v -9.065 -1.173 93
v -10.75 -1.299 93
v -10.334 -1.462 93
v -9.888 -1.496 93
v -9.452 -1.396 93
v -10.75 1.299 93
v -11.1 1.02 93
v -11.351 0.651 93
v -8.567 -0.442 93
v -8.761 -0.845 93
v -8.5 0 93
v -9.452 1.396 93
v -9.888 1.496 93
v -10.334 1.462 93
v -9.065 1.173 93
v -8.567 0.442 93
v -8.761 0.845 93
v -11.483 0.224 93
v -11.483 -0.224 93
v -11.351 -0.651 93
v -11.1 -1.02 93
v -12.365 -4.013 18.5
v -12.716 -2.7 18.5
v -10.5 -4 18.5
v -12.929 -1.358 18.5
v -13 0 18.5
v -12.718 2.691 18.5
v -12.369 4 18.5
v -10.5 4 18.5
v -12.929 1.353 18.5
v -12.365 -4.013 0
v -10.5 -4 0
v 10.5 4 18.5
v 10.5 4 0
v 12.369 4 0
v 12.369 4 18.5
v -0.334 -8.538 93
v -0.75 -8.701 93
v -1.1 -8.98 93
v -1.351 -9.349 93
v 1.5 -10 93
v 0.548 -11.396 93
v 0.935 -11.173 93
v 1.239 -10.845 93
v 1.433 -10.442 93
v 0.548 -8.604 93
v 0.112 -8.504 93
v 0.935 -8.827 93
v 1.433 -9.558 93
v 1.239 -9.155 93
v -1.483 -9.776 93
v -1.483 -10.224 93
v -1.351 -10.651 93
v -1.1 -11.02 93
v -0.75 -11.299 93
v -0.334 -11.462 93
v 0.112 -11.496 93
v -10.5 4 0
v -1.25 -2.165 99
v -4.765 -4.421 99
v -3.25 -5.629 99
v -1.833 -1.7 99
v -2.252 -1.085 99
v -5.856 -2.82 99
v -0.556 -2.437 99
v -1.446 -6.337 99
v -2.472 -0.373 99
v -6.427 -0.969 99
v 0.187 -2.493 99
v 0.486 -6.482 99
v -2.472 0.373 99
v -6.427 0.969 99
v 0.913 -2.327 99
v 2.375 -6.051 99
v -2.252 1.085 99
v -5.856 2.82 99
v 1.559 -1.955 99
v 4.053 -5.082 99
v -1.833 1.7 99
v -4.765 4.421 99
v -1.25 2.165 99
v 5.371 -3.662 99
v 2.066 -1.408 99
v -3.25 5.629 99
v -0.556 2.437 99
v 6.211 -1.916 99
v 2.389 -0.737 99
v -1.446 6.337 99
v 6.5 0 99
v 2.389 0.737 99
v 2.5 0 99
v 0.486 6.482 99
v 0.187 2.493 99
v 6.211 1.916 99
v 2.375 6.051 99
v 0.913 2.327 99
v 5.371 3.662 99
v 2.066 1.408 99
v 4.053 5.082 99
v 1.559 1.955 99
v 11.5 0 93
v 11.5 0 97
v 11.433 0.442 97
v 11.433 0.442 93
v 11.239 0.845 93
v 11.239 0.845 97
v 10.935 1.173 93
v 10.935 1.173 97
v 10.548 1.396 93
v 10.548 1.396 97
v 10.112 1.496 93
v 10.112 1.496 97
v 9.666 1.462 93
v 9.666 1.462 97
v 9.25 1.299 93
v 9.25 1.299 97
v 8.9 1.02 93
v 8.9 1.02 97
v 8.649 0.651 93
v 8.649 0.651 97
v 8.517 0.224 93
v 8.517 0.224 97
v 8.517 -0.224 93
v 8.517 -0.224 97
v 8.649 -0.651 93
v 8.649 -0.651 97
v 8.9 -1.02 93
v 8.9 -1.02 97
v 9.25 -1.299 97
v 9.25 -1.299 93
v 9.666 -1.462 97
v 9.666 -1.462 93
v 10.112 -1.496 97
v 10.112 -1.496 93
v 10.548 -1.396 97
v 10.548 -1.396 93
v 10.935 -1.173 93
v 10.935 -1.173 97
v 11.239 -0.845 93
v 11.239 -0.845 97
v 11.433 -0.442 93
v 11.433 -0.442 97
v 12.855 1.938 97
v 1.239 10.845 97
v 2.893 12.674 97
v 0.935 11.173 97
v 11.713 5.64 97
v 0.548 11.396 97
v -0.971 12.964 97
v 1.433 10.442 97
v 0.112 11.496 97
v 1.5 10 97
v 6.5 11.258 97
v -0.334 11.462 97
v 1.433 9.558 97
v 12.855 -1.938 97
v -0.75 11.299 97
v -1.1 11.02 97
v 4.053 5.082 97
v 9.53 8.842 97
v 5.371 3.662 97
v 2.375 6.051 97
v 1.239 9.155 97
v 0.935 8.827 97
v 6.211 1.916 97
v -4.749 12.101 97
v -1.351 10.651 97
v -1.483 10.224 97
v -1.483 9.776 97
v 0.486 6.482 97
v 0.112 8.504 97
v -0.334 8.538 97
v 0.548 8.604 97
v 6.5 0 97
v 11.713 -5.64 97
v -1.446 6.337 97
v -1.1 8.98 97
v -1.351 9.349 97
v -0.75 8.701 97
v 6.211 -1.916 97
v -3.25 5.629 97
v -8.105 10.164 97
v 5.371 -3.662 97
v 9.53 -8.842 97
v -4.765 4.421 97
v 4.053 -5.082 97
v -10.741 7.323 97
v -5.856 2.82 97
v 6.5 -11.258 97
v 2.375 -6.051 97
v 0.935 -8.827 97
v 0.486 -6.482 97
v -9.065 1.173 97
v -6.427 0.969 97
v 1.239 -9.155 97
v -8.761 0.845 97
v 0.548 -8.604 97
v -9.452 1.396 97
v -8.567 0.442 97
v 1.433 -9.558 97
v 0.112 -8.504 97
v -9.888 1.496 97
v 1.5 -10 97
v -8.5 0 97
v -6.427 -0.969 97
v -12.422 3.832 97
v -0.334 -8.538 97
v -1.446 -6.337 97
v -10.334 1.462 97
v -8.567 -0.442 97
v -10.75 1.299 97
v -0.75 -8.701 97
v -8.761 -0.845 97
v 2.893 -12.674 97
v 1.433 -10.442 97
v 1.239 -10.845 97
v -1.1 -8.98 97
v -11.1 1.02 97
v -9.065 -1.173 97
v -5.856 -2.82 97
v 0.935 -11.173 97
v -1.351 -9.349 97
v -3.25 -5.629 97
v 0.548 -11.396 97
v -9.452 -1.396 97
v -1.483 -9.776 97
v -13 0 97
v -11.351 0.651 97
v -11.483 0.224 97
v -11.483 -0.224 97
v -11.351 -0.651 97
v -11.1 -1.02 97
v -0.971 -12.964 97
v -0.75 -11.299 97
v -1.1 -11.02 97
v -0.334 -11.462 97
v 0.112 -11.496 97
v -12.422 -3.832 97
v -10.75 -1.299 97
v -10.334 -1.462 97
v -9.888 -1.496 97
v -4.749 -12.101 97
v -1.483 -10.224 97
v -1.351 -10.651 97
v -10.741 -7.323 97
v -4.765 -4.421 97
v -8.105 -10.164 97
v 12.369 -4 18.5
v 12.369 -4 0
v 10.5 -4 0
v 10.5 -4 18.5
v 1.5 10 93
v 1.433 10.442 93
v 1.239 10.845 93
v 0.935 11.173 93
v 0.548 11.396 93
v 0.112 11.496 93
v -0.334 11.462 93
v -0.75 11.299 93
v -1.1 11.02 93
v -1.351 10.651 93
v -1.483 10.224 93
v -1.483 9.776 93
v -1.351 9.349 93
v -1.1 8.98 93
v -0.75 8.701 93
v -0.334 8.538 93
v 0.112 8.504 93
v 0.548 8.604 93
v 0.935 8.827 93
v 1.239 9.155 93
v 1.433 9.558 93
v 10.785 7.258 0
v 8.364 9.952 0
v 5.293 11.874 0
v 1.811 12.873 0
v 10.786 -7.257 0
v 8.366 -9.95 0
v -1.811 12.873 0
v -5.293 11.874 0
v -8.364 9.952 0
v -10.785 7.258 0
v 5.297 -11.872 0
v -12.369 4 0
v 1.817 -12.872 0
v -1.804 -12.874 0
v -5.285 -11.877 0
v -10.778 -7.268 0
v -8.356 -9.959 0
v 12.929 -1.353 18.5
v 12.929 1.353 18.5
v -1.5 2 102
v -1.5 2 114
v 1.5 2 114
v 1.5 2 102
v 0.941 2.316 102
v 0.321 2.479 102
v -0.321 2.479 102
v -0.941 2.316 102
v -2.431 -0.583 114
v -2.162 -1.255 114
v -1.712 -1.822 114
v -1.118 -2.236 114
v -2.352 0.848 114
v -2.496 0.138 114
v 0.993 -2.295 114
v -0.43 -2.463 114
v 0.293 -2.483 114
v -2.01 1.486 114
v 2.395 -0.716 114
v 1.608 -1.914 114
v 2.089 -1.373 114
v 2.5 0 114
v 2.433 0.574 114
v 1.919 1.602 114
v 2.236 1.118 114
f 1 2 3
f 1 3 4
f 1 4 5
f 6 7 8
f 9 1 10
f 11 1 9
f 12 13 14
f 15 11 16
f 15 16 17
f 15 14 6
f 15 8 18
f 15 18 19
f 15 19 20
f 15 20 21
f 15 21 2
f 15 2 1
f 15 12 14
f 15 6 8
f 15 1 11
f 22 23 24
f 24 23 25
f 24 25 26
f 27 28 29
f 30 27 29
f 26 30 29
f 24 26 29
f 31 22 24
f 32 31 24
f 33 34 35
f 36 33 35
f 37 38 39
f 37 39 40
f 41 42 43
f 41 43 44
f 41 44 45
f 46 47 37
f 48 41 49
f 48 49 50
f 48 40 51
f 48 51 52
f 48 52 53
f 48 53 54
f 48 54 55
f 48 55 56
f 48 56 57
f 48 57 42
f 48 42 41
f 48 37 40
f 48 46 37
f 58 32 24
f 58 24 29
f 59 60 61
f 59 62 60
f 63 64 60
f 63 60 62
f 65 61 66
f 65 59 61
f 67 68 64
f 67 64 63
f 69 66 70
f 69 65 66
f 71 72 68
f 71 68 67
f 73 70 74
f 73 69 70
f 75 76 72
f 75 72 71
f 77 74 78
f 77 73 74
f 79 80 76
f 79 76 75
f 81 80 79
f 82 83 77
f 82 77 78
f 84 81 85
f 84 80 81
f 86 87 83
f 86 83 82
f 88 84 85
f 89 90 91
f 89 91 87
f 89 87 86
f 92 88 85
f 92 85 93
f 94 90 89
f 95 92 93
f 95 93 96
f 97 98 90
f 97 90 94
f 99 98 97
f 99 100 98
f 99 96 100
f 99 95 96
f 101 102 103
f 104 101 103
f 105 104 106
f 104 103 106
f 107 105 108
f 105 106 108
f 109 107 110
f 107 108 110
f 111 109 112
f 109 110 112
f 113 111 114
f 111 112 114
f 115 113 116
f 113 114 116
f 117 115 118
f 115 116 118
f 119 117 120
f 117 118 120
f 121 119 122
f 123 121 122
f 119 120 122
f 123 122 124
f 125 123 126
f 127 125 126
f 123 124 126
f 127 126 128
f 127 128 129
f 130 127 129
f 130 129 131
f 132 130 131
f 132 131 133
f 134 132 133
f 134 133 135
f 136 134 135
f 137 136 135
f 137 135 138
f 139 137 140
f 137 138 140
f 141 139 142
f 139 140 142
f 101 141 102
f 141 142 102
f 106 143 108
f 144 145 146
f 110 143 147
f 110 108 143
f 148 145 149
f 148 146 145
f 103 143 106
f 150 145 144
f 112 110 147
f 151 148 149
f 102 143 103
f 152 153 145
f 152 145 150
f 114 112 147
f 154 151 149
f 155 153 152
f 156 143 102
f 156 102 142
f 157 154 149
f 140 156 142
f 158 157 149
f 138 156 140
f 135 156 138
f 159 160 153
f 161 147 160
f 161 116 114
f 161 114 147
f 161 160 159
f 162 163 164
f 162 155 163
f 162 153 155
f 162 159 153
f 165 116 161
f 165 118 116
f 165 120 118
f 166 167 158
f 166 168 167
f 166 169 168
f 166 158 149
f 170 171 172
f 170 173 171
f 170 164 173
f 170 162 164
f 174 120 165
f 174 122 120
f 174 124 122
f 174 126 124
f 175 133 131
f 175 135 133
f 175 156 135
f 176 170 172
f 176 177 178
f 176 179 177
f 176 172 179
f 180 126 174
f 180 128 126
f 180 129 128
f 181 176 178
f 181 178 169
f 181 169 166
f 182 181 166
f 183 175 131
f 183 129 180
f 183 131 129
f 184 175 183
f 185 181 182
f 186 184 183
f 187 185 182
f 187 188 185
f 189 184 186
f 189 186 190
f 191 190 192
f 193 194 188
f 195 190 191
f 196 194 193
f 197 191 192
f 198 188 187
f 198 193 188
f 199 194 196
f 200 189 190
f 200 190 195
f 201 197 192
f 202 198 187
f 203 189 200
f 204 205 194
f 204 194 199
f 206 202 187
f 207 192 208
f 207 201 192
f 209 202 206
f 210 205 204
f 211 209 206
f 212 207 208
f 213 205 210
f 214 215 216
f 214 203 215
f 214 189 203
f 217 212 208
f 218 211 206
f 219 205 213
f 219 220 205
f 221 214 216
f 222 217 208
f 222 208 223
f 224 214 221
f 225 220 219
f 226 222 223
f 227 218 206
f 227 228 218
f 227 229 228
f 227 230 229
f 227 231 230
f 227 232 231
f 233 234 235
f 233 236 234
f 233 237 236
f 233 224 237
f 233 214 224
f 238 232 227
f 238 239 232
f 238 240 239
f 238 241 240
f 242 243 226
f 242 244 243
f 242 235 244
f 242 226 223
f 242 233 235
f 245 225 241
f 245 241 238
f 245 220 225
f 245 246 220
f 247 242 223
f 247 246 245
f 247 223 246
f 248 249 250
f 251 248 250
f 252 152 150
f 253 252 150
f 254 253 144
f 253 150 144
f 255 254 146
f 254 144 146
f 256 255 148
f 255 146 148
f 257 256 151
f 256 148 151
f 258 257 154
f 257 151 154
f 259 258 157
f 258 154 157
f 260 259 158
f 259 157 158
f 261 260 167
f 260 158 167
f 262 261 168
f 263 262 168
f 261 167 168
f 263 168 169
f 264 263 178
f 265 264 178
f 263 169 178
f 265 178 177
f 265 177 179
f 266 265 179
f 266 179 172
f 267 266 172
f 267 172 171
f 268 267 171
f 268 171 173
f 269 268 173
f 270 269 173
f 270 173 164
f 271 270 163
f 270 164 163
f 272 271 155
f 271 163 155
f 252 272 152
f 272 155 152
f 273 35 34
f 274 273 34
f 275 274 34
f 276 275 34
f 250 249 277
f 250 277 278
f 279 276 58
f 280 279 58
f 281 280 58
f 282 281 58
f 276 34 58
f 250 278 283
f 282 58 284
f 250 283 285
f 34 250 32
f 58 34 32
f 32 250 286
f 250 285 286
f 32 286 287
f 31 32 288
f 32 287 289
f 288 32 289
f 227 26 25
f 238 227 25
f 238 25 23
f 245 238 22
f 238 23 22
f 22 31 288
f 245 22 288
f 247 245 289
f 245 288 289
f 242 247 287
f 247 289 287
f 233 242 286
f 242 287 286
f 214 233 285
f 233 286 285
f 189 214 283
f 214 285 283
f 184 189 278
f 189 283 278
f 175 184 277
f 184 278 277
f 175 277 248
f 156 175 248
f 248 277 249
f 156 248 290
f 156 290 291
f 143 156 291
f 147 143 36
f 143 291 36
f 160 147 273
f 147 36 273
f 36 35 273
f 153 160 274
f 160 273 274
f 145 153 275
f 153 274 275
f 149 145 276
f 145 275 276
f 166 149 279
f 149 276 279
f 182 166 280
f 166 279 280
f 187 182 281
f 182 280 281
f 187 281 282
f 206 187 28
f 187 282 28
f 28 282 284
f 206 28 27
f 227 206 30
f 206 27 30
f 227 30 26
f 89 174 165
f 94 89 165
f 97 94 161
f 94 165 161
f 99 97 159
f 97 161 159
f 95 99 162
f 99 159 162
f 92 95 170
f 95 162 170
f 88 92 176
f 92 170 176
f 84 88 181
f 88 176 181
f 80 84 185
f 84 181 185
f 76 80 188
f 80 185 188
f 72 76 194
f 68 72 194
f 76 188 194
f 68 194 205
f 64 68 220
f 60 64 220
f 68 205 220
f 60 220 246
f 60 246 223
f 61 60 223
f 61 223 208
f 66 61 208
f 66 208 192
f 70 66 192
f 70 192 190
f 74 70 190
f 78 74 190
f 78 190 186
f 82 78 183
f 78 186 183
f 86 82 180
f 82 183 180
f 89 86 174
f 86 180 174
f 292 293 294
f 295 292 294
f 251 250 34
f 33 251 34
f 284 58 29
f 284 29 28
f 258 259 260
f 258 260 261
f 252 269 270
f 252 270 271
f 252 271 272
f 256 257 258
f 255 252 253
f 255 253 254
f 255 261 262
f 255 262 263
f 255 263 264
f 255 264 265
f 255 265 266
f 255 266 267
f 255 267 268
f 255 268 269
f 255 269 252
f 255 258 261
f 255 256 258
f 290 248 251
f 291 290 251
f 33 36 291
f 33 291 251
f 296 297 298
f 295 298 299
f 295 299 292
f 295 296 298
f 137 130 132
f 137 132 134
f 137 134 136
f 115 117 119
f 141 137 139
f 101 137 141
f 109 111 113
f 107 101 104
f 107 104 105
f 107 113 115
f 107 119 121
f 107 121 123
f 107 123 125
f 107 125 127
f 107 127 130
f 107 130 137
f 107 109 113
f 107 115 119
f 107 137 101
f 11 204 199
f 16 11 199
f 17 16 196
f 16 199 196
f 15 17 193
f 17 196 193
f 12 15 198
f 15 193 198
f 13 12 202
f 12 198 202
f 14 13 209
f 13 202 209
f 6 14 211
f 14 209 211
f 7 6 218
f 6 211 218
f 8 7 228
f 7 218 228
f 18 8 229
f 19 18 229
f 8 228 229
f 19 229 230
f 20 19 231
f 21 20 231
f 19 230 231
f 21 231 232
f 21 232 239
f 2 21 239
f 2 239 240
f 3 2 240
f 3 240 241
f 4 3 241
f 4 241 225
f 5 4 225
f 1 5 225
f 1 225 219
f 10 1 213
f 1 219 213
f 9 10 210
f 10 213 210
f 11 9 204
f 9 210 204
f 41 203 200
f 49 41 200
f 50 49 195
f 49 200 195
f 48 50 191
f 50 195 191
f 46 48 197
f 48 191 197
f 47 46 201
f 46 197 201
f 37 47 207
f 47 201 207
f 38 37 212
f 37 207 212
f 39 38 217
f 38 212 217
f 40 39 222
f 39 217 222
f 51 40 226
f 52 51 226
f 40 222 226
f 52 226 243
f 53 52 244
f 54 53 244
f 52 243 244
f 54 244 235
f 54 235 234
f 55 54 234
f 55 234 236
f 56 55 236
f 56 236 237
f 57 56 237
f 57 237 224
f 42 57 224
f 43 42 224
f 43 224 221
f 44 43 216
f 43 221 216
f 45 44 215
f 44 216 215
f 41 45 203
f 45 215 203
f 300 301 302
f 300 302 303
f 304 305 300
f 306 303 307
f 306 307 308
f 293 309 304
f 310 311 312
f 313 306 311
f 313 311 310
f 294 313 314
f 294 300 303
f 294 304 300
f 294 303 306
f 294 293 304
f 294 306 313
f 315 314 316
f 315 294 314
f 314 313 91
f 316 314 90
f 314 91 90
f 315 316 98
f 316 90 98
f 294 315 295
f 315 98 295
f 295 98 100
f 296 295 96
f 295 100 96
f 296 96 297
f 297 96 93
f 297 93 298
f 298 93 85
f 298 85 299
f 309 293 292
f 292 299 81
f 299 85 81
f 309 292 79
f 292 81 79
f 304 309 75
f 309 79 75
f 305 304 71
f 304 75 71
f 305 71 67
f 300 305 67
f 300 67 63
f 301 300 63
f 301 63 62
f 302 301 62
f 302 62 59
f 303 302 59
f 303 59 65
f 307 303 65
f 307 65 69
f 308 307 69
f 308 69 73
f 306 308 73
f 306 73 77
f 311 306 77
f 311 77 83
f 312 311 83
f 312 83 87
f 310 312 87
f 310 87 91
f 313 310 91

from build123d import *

# Parameters (mm, degrees)
ESQUISSE1_R             = 13
BOSS_EXTRU_1_DEPTH      = 97
ESQUISSE2_R             = 2.5
BOSS_EXTRU_2_DEPTH      = 17
ENL_V_MAT_EXTRU_1_DEPTH = 18.5
ESQUISSE4_R             = 6.5
ESQUISSE4_R_2           = 2.5
BOSS_EXTRU_3_DEPTH      = 2
ESQUISSE5_R             = 1.5
ENL_V_MAT_EXTRU_2_DEPTH = 4
ENL_V_START             = -12
ENL_V_MAT_EXTRU_3_DEPTH = 12


with BuildPart() as part:
    # Esquisse1 → Boss.-Extru.1 (new body)
    with BuildSketch(Plane.XY):
        with Locations(Location((0, 0, 0), (0, 0, 180))):
            Circle(ESQUISSE1_R)
    extrude(amount=BOSS_EXTRU_1_DEPTH)

    # Esquisse2 → Boss.-Extru.2 (add)
    with BuildSketch(Plane.XY.offset(97)):
        Circle(ESQUISSE2_R)
    extrude(amount=BOSS_EXTRU_2_DEPTH)

    # Esquisse3 → Enlèv. mat.-Extru.1 (cut)
    with BuildSketch(Plane(origin=(0, 0, 0), x_dir=(-1, 0, 0), z_dir=(0, 0, -1))):
        with BuildLine():
            Line((-10.5, 0), (-10.5, 4))
            Line((-10.5, 4), (-12.369316877, 4))
            ThreePointArc((-12.369316877, 4), (-13, 0), (-12.369316877, -4))
            Line((-12.369316877, -4), (-10.5, -4))
            Line((-10.5, -4), (-10.5, 0))
        make_face()
        with BuildLine():
            Line((10.5, 0), (10.5, 4))
            Line((10.5, 4), (12.369316877, 4))
            ThreePointArc((12.369316877, 4), (12.99999812, -0.006990598), (12.365007817, -4.013300596))
            Line((12.365007817, -4.013300596), (10.5, -4))
            Line((10.5, -4), (10.5, 0))
        make_face()
    extrude(amount=-ENL_V_MAT_EXTRU_1_DEPTH, mode=Mode.SUBTRACT)

    # Esquisse4 → Boss.-Extru.3 (add)
    with BuildSketch(Plane.XY.offset(97)):
        Circle(ESQUISSE4_R)
        Circle(ESQUISSE4_R_2, mode=Mode.SUBTRACT)
    extrude(amount=BOSS_EXTRU_3_DEPTH)

    # Esquisse5 → Enlèv. mat.-Extru.2 (cut)
    with BuildSketch(Plane.XY.offset(97)):
        with Locations((0, 10)):
            Circle(ESQUISSE5_R)
        with Locations((-10, 0)):
            Circle(ESQUISSE5_R)
        with Locations((0, -10)):
            Circle(ESQUISSE5_R)
        with Locations((10, 0)):
            Circle(ESQUISSE5_R)
    extrude(amount=-ENL_V_MAT_EXTRU_2_DEPTH, mode=Mode.SUBTRACT)

    # Esquisse6 → Enlèv. mat.-Extru.3 (cut)
    with BuildSketch(Plane.XY.offset(114).offset(ENL_V_START)):
        with BuildLine():
            Line((0, 2), (1.5, 2))
            ThreePointArc((1.5, 2), (0, 2.5), (-1.5, 2))
            Line((-1.5, 2), (0, 2))
        make_face()
    extrude(amount=ENL_V_MAT_EXTRU_3_DEPTH, mode=Mode.SUBTRACT)


solid = part.part
